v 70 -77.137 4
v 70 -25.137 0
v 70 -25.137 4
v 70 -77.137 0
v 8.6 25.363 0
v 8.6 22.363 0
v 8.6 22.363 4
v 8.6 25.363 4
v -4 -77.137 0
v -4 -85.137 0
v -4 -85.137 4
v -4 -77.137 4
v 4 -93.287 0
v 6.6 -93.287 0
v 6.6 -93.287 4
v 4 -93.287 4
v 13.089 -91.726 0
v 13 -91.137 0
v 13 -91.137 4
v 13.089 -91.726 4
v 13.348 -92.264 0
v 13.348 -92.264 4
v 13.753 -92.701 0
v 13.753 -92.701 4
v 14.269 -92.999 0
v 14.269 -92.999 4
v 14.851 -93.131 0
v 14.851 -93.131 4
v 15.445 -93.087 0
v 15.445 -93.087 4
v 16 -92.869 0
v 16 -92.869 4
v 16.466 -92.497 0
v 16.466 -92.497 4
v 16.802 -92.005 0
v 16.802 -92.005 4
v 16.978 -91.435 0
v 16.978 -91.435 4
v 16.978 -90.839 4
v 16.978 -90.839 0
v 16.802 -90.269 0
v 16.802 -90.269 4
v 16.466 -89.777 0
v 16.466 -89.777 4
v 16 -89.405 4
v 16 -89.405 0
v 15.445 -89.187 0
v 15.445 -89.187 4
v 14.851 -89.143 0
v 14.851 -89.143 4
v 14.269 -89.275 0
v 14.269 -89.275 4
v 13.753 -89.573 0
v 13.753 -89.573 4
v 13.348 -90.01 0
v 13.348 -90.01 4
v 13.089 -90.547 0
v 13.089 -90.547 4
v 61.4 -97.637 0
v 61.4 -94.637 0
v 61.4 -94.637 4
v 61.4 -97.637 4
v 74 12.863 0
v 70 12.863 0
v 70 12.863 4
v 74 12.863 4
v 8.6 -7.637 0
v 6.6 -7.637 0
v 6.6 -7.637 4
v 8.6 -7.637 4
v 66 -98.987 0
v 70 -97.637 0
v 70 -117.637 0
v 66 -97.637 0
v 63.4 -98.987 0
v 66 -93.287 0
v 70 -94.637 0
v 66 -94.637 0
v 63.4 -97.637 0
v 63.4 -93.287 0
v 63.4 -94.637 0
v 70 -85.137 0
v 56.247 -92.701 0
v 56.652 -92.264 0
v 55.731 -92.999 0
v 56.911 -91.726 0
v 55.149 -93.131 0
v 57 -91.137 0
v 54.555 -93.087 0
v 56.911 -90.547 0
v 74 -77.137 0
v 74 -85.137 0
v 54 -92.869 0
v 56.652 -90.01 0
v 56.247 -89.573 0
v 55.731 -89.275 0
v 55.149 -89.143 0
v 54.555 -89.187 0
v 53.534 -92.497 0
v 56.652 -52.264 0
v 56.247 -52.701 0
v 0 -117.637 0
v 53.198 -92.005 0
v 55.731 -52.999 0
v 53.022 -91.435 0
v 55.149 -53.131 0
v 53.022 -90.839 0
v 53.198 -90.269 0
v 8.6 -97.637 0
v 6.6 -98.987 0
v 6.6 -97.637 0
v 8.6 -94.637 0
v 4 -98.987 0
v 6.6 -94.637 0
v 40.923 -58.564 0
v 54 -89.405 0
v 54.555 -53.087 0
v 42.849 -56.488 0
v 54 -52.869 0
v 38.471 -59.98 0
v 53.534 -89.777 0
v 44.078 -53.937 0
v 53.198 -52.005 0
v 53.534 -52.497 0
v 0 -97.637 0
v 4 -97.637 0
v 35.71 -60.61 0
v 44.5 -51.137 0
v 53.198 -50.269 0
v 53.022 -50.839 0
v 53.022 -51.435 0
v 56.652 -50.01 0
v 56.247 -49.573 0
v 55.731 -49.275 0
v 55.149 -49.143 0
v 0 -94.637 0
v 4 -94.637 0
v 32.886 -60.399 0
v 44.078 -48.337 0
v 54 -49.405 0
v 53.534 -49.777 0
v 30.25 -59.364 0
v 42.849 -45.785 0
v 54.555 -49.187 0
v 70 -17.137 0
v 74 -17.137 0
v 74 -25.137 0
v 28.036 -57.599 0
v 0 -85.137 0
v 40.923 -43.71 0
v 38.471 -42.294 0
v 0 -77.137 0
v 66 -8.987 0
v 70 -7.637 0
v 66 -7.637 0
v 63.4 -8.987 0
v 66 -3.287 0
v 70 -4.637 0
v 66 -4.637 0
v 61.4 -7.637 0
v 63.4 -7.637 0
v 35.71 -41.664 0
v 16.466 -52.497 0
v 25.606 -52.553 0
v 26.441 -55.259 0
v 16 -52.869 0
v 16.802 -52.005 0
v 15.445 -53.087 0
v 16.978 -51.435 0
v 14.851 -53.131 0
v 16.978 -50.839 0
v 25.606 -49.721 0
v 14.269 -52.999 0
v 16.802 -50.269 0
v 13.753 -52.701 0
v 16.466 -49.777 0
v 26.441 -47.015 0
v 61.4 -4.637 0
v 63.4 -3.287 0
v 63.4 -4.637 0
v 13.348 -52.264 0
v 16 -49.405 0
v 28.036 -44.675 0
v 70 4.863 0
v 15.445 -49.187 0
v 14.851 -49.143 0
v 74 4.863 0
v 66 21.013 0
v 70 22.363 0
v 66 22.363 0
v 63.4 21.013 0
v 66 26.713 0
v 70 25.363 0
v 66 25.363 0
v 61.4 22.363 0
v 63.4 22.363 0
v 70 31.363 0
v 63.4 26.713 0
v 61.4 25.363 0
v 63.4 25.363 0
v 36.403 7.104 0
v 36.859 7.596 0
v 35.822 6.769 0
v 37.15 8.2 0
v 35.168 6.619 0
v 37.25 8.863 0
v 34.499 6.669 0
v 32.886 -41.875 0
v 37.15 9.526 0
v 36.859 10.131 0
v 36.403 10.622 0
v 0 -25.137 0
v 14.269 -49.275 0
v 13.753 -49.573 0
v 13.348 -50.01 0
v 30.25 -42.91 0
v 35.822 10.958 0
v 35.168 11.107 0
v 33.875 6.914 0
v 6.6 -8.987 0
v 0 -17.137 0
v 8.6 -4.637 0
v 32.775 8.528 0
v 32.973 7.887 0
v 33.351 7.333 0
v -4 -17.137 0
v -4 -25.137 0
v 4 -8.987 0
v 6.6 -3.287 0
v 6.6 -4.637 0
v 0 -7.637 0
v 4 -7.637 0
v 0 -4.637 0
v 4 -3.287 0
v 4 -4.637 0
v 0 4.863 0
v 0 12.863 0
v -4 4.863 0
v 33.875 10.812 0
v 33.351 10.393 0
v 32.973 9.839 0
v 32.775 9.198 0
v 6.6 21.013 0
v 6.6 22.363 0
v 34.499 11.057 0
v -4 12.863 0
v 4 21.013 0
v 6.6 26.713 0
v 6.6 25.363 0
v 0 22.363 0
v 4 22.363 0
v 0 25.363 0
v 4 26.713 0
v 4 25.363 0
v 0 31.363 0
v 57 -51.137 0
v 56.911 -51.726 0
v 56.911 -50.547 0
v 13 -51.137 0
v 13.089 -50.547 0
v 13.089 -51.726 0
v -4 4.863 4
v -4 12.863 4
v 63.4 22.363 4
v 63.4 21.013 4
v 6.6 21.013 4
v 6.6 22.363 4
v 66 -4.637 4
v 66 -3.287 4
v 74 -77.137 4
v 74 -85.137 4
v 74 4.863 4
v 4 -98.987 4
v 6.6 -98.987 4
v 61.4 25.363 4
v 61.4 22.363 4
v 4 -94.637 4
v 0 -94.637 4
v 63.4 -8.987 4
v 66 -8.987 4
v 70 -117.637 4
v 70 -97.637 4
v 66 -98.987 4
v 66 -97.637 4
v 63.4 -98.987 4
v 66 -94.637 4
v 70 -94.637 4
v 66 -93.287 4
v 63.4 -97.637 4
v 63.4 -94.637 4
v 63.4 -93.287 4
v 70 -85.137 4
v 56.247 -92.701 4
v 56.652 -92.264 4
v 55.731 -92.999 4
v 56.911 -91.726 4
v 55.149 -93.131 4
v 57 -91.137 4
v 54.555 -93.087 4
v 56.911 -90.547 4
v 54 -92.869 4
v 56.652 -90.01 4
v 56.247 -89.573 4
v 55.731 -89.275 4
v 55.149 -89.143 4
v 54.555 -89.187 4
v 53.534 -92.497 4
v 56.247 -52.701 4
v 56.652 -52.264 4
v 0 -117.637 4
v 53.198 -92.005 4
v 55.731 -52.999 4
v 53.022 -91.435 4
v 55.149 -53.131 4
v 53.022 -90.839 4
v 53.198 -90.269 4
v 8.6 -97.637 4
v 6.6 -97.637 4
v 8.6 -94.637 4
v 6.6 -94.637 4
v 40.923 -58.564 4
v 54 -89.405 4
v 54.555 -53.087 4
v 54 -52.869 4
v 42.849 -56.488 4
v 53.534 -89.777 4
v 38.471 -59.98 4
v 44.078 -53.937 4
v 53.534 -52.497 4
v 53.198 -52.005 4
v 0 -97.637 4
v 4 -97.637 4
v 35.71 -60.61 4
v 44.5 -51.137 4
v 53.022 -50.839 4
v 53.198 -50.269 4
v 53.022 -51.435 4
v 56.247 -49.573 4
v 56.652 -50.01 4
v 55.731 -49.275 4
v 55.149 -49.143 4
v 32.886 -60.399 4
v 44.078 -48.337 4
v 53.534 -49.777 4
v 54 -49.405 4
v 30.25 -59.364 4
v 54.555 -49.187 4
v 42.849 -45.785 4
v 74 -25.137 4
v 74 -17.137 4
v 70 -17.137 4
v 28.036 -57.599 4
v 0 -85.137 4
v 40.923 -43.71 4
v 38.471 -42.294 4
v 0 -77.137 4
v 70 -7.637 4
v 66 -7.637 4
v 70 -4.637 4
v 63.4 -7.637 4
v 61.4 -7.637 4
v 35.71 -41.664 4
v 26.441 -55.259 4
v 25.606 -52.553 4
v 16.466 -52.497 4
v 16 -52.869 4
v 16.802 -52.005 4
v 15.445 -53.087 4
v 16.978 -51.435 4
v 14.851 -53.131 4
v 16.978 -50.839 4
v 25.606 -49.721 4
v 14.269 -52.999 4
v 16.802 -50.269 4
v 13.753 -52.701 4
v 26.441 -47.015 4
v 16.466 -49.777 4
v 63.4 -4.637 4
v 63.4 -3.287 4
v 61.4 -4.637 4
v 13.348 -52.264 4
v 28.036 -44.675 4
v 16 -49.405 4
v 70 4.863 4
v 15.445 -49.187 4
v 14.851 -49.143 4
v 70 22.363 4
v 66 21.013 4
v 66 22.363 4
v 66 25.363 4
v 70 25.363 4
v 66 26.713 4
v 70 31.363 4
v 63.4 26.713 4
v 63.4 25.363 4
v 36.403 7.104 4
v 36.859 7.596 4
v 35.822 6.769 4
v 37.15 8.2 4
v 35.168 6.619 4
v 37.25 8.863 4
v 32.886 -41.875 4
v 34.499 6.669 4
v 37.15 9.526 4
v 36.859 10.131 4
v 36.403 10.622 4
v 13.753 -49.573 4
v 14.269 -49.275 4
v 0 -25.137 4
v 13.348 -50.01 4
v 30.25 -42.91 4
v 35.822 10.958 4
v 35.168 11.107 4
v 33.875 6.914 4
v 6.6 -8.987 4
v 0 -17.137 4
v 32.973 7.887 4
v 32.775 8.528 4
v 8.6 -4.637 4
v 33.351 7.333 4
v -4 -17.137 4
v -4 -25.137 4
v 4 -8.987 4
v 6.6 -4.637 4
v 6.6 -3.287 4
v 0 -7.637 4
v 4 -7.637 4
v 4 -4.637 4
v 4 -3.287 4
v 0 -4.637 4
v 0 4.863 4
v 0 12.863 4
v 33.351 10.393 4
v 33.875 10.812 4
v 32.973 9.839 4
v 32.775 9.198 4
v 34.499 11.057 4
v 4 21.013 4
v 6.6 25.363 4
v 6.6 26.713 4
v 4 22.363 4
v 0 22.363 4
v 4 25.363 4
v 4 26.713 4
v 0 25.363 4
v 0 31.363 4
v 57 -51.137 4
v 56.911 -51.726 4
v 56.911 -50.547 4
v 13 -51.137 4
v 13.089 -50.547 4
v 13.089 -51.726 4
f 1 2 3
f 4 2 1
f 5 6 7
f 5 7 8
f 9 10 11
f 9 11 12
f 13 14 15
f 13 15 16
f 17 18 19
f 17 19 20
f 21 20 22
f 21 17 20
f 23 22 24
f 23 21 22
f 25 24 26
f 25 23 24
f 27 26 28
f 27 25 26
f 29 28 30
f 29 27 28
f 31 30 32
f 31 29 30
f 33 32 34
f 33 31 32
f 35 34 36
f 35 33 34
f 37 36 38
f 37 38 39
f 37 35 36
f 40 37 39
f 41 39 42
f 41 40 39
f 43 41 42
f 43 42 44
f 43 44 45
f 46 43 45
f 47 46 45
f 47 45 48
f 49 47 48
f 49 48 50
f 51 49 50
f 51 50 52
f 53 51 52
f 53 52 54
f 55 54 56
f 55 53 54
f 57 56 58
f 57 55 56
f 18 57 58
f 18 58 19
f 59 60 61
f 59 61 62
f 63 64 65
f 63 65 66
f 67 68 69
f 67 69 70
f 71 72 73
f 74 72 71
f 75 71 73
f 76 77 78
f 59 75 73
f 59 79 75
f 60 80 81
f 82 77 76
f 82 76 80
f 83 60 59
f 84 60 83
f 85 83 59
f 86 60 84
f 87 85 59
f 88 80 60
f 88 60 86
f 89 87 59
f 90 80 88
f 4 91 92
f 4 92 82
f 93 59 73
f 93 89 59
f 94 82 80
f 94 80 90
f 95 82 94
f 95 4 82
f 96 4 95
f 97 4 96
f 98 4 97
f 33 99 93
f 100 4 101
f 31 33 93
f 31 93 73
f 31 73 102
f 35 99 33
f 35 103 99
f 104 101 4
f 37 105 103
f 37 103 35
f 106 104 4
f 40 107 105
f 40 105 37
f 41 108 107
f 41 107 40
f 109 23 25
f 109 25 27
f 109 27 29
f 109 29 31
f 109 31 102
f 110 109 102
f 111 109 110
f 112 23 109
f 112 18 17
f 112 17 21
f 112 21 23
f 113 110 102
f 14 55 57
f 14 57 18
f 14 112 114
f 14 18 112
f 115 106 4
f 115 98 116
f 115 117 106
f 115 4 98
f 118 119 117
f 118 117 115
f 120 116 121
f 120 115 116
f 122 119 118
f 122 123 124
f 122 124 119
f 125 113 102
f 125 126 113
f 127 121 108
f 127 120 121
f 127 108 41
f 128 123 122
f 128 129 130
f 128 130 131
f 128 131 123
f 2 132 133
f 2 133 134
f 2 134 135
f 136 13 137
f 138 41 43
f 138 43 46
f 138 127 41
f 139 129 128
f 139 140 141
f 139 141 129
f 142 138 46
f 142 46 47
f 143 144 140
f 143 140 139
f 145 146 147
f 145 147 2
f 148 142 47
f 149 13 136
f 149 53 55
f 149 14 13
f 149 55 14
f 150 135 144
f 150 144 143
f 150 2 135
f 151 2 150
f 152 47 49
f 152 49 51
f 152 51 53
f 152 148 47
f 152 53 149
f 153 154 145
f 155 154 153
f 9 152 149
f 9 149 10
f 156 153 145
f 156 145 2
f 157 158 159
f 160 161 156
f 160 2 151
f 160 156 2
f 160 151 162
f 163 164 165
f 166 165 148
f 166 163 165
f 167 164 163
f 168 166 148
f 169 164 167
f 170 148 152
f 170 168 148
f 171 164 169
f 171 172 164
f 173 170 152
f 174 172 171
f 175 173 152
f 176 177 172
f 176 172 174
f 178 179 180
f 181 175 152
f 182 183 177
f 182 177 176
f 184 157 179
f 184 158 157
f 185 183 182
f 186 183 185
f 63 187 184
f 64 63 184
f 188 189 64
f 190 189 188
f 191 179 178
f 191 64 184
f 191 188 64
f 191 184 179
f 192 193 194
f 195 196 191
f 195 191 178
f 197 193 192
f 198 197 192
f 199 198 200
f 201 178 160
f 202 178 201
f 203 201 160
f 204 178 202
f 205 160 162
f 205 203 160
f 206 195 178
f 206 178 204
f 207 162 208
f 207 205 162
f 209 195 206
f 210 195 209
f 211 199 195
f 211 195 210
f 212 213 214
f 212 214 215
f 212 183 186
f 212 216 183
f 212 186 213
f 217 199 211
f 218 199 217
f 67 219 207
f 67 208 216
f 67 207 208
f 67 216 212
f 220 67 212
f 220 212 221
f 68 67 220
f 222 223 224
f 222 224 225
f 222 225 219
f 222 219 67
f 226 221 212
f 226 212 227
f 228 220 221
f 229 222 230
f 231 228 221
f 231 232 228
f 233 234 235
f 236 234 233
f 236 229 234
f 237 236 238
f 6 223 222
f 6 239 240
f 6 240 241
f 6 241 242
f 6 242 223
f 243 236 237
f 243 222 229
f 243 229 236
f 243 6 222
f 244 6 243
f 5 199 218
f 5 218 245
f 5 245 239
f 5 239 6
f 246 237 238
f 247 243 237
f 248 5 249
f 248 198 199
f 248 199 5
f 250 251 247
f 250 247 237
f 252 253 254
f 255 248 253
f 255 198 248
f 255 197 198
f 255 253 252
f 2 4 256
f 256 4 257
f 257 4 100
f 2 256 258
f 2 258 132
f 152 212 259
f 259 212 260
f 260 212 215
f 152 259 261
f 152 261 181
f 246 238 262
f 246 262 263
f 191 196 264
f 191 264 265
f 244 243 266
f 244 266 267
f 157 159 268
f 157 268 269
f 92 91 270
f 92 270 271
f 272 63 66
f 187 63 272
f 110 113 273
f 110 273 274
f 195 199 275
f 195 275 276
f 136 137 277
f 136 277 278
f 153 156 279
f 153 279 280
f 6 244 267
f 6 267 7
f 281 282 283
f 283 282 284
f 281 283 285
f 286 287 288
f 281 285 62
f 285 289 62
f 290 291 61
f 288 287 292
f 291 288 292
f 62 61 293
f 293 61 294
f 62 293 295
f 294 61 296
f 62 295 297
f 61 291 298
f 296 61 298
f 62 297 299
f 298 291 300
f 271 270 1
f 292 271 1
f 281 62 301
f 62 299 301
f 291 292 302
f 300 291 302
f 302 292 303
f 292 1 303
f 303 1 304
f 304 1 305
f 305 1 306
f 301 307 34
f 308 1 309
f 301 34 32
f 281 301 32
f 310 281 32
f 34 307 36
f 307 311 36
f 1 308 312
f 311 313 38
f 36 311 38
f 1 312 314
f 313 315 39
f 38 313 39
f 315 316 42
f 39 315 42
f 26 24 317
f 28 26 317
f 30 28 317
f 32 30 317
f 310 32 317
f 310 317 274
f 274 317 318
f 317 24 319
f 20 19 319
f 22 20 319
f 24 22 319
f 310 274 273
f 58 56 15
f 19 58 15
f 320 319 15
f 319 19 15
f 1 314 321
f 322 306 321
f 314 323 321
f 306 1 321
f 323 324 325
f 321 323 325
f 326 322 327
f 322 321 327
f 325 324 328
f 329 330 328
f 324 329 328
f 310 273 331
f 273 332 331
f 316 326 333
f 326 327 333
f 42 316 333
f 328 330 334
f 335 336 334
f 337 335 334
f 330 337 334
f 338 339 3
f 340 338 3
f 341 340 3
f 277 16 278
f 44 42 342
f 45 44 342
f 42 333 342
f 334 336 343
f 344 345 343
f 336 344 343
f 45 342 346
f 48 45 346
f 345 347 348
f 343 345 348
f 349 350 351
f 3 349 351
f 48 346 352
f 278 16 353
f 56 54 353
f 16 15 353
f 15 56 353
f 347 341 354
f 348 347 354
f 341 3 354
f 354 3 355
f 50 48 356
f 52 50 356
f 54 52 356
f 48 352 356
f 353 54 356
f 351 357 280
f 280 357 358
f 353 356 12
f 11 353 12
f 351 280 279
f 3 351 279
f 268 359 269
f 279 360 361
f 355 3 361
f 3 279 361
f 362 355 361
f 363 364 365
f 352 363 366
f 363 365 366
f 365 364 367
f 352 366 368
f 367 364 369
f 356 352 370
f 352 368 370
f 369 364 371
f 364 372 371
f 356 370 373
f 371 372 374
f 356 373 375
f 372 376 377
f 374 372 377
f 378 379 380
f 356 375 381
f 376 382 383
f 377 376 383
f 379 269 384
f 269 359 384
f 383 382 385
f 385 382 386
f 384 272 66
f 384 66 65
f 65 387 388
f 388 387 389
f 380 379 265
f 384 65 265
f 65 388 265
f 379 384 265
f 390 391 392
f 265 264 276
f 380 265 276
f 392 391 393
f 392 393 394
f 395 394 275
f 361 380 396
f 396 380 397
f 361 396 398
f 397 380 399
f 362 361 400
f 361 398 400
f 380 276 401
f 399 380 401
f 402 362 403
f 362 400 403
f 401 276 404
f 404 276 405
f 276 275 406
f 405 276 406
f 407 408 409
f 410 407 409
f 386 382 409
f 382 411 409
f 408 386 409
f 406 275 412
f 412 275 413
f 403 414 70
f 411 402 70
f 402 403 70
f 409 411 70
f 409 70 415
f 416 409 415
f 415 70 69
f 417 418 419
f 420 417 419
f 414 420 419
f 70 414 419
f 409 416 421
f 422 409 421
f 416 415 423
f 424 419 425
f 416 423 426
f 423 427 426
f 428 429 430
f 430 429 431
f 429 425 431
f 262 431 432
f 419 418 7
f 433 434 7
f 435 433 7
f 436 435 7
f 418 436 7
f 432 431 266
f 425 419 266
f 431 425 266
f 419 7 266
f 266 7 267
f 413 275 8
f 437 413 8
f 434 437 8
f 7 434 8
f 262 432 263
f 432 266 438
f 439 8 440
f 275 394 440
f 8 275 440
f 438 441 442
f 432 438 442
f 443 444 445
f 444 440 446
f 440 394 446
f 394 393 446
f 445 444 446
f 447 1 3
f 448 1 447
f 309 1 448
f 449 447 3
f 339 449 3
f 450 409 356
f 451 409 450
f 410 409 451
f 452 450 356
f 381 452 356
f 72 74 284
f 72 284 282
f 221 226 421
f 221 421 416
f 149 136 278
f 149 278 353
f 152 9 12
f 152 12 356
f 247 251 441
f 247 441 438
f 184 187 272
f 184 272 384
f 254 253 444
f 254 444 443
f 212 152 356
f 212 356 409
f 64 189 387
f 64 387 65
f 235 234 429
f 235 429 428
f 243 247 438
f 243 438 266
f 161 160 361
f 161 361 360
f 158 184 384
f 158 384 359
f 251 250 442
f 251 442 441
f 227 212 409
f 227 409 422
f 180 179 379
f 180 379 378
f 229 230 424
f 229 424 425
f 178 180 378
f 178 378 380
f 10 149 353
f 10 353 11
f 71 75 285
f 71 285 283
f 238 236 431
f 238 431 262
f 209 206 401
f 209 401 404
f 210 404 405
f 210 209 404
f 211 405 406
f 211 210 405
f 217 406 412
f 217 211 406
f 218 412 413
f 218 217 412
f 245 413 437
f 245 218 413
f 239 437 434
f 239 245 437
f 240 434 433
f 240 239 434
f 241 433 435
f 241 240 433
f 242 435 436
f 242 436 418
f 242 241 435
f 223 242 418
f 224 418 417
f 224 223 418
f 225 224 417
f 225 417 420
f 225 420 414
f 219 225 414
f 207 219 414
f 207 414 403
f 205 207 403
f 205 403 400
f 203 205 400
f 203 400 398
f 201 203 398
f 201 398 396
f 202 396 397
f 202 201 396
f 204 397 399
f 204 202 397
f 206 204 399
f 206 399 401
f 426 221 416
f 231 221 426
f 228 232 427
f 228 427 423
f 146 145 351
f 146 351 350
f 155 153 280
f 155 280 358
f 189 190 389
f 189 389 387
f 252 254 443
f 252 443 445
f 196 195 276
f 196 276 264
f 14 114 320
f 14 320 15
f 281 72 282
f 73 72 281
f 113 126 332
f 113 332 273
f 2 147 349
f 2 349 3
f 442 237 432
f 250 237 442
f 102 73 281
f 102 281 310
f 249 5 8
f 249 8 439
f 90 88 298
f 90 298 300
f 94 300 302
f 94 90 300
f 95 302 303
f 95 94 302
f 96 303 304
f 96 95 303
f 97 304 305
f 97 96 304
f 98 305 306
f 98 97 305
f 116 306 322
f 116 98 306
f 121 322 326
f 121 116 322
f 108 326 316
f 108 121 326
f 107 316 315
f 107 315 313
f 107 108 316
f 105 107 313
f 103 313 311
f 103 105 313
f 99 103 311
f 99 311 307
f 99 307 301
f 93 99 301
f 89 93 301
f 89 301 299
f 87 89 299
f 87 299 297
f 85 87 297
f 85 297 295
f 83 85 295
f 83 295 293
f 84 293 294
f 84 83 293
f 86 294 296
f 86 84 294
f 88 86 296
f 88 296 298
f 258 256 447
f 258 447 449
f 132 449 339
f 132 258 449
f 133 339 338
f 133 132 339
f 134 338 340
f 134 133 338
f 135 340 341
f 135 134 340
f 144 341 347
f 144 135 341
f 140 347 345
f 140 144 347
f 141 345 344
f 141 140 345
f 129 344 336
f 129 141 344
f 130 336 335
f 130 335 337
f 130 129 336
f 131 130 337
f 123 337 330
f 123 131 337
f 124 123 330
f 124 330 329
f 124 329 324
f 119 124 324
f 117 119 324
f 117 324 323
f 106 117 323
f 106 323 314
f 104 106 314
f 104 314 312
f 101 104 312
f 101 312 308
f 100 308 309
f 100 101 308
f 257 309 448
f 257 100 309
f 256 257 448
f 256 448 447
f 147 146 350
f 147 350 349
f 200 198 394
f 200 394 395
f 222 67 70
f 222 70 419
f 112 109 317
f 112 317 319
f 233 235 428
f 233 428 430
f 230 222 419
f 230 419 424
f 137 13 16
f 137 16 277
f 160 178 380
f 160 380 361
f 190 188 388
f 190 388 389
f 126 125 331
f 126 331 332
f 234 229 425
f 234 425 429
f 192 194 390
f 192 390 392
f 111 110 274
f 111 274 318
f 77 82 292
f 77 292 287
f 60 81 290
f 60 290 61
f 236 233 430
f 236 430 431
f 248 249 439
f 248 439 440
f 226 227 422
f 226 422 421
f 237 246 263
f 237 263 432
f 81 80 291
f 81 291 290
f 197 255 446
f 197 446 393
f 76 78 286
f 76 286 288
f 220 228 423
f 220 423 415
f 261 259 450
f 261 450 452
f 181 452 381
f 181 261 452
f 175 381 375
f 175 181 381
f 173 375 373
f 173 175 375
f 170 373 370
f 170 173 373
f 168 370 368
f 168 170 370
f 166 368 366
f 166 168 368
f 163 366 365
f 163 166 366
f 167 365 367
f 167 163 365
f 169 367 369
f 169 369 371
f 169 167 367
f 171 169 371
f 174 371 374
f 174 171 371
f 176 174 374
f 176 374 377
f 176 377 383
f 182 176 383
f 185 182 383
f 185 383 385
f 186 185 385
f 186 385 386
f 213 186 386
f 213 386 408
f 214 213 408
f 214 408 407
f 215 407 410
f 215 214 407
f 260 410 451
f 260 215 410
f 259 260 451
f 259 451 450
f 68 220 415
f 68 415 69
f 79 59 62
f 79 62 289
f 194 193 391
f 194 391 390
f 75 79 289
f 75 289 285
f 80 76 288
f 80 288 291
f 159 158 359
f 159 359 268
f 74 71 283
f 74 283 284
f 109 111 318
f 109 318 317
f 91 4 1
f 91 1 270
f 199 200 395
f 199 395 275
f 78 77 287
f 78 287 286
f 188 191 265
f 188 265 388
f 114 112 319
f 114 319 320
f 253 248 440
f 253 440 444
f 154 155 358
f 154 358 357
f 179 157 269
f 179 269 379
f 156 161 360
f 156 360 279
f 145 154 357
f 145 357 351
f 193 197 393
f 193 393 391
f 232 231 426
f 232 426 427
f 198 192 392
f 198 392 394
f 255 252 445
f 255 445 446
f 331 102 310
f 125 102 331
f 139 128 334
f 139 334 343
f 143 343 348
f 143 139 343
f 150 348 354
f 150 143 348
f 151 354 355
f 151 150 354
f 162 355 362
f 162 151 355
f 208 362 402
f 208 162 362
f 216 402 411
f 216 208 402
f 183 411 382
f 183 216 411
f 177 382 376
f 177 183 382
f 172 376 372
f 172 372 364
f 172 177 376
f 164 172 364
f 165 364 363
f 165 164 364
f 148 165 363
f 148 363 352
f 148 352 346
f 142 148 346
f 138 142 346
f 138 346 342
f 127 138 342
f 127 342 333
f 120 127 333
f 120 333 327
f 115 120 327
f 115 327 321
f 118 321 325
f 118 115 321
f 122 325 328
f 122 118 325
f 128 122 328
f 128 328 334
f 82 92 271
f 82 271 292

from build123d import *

# Parameters (mm, degrees)
SKETCH_1_R      = 2.25
SKETCH_1_R_2    = 9.5
SKETCH_1_R_3    = 2
EXTRUDE_1_DEPTH = 4


with BuildPart() as part:
    # 草图1 → 凸台-拉伸1 (new body)
    with BuildSketch(Plane.XY):
        Polygon((0, 4.863043478), (-4, 4.863043478), (-4, 12.863043478), (0, 12.863043478), (0, 22.363043478), (4, 22.363043478), (4, 21.013043478), (6.6, 21.013043478), (6.6, 22.363043478), (8.6, 22.363043478), (8.6, 25.363043478), (6.6, 25.363043478), (6.6, 26.713043478), (4, 26.713043478), (4, 25.363043478), (0, 25.363043478), (0, 31.363043478), (70, 31.363043478), (70, 25.363043478), (66, 25.363043478), (66, 26.713043478), (63.4, 26.713043478), (63.4, 25.363043478), (61.4, 25.363043478), (61.4, 22.363043478), (63.4, 22.363043478), (63.4, 21.013043478), (66, 21.013043478), (66, 22.363043478), (70, 22.363043478), (70, 12.863043478), (74, 12.863043478), (74, 4.863043478), (70, 4.863043478), (70, -4.636956522), (66, -4.636956522), (66, -3.286956522), (63.4, -3.286956522), (63.4, -4.636956522), (61.4, -4.636956522), (61.4, -7.636956522), (63.4, -7.636956522), (63.4, -8.986956522), (66, -8.986956522), (66, -7.636956522), (70, -7.636956522), (70, -17.136956522), (74, -17.136956522), (74, -25.136956522), (70, -25.136956522), (70, -77.136956522), (74, -77.136956522), (74, -85.136956522), (70, -85.136956522), (70, -94.636956522), (66, -94.636956522), (66, -93.286956522), (63.4, -93.286956522), (63.4, -94.636956522), (61.4, -94.636956522), (61.4, -97.636956522), (63.4, -97.636956522), (63.4, -98.986956522), (66, -98.986956522), (66, -97.636956522), (70, -97.636956522), (70, -117.636956522), (0, -117.636956522), (0, -97.636956522), (4, -97.636956522), (4, -98.986956522), (6.6, -98.986956522), (6.6, -97.636956522), (8.6, -97.636956522), (8.6, -94.636956522), (6.6, -94.636956522), (6.6, -93.286956522), (4, -93.286956522), (4, -94.636956522), (0, -94.636956522), (0, -85.136956522), (-4, -85.136956522), (-4, -77.136956522), (0, -77.136956522), (0, -25.136956522), (-4, -25.136956522), (-4, -17.136956522), (0, -17.136956522), (0, -7.636956522), (4, -7.636956522), (4, -8.986956522), (6.6, -8.986956522), (6.6, -7.636956522), (8.6, -7.636956522), (8.6, -4.636956522), (6.6, -4.636956522), (6.6, -3.286956522), (4, -3.286956522), (4, -4.636956522), (0, -4.636956522), align=None)
        with Locations((35, 8.863043478)):
            Circle(SKETCH_1_R, mode=Mode.SUBTRACT)
        with Locations((35, -51.136956522)):
            Circle(SKETCH_1_R_2, mode=Mode.SUBTRACT)
        with Locations((55, -51.136956522)):
            Circle(SKETCH_1_R_3, mode=Mode.SUBTRACT)
        with Locations(Location((15, -51.136956522, 0), (0, 0, 180))):
            Circle(SKETCH_1_R_3, mode=Mode.SUBTRACT)
        with Locations((55, -91.136956522)):
            Circle(SKETCH_1_R_3, mode=Mode.SUBTRACT)
        with Locations(Location((15, -91.136956522, 0), (0, 0, 180))):
            Circle(SKETCH_1_R_3, mode=Mode.SUBTRACT)
    extrude(amount=EXTRUDE_1_DEPTH)


solid = part.part
